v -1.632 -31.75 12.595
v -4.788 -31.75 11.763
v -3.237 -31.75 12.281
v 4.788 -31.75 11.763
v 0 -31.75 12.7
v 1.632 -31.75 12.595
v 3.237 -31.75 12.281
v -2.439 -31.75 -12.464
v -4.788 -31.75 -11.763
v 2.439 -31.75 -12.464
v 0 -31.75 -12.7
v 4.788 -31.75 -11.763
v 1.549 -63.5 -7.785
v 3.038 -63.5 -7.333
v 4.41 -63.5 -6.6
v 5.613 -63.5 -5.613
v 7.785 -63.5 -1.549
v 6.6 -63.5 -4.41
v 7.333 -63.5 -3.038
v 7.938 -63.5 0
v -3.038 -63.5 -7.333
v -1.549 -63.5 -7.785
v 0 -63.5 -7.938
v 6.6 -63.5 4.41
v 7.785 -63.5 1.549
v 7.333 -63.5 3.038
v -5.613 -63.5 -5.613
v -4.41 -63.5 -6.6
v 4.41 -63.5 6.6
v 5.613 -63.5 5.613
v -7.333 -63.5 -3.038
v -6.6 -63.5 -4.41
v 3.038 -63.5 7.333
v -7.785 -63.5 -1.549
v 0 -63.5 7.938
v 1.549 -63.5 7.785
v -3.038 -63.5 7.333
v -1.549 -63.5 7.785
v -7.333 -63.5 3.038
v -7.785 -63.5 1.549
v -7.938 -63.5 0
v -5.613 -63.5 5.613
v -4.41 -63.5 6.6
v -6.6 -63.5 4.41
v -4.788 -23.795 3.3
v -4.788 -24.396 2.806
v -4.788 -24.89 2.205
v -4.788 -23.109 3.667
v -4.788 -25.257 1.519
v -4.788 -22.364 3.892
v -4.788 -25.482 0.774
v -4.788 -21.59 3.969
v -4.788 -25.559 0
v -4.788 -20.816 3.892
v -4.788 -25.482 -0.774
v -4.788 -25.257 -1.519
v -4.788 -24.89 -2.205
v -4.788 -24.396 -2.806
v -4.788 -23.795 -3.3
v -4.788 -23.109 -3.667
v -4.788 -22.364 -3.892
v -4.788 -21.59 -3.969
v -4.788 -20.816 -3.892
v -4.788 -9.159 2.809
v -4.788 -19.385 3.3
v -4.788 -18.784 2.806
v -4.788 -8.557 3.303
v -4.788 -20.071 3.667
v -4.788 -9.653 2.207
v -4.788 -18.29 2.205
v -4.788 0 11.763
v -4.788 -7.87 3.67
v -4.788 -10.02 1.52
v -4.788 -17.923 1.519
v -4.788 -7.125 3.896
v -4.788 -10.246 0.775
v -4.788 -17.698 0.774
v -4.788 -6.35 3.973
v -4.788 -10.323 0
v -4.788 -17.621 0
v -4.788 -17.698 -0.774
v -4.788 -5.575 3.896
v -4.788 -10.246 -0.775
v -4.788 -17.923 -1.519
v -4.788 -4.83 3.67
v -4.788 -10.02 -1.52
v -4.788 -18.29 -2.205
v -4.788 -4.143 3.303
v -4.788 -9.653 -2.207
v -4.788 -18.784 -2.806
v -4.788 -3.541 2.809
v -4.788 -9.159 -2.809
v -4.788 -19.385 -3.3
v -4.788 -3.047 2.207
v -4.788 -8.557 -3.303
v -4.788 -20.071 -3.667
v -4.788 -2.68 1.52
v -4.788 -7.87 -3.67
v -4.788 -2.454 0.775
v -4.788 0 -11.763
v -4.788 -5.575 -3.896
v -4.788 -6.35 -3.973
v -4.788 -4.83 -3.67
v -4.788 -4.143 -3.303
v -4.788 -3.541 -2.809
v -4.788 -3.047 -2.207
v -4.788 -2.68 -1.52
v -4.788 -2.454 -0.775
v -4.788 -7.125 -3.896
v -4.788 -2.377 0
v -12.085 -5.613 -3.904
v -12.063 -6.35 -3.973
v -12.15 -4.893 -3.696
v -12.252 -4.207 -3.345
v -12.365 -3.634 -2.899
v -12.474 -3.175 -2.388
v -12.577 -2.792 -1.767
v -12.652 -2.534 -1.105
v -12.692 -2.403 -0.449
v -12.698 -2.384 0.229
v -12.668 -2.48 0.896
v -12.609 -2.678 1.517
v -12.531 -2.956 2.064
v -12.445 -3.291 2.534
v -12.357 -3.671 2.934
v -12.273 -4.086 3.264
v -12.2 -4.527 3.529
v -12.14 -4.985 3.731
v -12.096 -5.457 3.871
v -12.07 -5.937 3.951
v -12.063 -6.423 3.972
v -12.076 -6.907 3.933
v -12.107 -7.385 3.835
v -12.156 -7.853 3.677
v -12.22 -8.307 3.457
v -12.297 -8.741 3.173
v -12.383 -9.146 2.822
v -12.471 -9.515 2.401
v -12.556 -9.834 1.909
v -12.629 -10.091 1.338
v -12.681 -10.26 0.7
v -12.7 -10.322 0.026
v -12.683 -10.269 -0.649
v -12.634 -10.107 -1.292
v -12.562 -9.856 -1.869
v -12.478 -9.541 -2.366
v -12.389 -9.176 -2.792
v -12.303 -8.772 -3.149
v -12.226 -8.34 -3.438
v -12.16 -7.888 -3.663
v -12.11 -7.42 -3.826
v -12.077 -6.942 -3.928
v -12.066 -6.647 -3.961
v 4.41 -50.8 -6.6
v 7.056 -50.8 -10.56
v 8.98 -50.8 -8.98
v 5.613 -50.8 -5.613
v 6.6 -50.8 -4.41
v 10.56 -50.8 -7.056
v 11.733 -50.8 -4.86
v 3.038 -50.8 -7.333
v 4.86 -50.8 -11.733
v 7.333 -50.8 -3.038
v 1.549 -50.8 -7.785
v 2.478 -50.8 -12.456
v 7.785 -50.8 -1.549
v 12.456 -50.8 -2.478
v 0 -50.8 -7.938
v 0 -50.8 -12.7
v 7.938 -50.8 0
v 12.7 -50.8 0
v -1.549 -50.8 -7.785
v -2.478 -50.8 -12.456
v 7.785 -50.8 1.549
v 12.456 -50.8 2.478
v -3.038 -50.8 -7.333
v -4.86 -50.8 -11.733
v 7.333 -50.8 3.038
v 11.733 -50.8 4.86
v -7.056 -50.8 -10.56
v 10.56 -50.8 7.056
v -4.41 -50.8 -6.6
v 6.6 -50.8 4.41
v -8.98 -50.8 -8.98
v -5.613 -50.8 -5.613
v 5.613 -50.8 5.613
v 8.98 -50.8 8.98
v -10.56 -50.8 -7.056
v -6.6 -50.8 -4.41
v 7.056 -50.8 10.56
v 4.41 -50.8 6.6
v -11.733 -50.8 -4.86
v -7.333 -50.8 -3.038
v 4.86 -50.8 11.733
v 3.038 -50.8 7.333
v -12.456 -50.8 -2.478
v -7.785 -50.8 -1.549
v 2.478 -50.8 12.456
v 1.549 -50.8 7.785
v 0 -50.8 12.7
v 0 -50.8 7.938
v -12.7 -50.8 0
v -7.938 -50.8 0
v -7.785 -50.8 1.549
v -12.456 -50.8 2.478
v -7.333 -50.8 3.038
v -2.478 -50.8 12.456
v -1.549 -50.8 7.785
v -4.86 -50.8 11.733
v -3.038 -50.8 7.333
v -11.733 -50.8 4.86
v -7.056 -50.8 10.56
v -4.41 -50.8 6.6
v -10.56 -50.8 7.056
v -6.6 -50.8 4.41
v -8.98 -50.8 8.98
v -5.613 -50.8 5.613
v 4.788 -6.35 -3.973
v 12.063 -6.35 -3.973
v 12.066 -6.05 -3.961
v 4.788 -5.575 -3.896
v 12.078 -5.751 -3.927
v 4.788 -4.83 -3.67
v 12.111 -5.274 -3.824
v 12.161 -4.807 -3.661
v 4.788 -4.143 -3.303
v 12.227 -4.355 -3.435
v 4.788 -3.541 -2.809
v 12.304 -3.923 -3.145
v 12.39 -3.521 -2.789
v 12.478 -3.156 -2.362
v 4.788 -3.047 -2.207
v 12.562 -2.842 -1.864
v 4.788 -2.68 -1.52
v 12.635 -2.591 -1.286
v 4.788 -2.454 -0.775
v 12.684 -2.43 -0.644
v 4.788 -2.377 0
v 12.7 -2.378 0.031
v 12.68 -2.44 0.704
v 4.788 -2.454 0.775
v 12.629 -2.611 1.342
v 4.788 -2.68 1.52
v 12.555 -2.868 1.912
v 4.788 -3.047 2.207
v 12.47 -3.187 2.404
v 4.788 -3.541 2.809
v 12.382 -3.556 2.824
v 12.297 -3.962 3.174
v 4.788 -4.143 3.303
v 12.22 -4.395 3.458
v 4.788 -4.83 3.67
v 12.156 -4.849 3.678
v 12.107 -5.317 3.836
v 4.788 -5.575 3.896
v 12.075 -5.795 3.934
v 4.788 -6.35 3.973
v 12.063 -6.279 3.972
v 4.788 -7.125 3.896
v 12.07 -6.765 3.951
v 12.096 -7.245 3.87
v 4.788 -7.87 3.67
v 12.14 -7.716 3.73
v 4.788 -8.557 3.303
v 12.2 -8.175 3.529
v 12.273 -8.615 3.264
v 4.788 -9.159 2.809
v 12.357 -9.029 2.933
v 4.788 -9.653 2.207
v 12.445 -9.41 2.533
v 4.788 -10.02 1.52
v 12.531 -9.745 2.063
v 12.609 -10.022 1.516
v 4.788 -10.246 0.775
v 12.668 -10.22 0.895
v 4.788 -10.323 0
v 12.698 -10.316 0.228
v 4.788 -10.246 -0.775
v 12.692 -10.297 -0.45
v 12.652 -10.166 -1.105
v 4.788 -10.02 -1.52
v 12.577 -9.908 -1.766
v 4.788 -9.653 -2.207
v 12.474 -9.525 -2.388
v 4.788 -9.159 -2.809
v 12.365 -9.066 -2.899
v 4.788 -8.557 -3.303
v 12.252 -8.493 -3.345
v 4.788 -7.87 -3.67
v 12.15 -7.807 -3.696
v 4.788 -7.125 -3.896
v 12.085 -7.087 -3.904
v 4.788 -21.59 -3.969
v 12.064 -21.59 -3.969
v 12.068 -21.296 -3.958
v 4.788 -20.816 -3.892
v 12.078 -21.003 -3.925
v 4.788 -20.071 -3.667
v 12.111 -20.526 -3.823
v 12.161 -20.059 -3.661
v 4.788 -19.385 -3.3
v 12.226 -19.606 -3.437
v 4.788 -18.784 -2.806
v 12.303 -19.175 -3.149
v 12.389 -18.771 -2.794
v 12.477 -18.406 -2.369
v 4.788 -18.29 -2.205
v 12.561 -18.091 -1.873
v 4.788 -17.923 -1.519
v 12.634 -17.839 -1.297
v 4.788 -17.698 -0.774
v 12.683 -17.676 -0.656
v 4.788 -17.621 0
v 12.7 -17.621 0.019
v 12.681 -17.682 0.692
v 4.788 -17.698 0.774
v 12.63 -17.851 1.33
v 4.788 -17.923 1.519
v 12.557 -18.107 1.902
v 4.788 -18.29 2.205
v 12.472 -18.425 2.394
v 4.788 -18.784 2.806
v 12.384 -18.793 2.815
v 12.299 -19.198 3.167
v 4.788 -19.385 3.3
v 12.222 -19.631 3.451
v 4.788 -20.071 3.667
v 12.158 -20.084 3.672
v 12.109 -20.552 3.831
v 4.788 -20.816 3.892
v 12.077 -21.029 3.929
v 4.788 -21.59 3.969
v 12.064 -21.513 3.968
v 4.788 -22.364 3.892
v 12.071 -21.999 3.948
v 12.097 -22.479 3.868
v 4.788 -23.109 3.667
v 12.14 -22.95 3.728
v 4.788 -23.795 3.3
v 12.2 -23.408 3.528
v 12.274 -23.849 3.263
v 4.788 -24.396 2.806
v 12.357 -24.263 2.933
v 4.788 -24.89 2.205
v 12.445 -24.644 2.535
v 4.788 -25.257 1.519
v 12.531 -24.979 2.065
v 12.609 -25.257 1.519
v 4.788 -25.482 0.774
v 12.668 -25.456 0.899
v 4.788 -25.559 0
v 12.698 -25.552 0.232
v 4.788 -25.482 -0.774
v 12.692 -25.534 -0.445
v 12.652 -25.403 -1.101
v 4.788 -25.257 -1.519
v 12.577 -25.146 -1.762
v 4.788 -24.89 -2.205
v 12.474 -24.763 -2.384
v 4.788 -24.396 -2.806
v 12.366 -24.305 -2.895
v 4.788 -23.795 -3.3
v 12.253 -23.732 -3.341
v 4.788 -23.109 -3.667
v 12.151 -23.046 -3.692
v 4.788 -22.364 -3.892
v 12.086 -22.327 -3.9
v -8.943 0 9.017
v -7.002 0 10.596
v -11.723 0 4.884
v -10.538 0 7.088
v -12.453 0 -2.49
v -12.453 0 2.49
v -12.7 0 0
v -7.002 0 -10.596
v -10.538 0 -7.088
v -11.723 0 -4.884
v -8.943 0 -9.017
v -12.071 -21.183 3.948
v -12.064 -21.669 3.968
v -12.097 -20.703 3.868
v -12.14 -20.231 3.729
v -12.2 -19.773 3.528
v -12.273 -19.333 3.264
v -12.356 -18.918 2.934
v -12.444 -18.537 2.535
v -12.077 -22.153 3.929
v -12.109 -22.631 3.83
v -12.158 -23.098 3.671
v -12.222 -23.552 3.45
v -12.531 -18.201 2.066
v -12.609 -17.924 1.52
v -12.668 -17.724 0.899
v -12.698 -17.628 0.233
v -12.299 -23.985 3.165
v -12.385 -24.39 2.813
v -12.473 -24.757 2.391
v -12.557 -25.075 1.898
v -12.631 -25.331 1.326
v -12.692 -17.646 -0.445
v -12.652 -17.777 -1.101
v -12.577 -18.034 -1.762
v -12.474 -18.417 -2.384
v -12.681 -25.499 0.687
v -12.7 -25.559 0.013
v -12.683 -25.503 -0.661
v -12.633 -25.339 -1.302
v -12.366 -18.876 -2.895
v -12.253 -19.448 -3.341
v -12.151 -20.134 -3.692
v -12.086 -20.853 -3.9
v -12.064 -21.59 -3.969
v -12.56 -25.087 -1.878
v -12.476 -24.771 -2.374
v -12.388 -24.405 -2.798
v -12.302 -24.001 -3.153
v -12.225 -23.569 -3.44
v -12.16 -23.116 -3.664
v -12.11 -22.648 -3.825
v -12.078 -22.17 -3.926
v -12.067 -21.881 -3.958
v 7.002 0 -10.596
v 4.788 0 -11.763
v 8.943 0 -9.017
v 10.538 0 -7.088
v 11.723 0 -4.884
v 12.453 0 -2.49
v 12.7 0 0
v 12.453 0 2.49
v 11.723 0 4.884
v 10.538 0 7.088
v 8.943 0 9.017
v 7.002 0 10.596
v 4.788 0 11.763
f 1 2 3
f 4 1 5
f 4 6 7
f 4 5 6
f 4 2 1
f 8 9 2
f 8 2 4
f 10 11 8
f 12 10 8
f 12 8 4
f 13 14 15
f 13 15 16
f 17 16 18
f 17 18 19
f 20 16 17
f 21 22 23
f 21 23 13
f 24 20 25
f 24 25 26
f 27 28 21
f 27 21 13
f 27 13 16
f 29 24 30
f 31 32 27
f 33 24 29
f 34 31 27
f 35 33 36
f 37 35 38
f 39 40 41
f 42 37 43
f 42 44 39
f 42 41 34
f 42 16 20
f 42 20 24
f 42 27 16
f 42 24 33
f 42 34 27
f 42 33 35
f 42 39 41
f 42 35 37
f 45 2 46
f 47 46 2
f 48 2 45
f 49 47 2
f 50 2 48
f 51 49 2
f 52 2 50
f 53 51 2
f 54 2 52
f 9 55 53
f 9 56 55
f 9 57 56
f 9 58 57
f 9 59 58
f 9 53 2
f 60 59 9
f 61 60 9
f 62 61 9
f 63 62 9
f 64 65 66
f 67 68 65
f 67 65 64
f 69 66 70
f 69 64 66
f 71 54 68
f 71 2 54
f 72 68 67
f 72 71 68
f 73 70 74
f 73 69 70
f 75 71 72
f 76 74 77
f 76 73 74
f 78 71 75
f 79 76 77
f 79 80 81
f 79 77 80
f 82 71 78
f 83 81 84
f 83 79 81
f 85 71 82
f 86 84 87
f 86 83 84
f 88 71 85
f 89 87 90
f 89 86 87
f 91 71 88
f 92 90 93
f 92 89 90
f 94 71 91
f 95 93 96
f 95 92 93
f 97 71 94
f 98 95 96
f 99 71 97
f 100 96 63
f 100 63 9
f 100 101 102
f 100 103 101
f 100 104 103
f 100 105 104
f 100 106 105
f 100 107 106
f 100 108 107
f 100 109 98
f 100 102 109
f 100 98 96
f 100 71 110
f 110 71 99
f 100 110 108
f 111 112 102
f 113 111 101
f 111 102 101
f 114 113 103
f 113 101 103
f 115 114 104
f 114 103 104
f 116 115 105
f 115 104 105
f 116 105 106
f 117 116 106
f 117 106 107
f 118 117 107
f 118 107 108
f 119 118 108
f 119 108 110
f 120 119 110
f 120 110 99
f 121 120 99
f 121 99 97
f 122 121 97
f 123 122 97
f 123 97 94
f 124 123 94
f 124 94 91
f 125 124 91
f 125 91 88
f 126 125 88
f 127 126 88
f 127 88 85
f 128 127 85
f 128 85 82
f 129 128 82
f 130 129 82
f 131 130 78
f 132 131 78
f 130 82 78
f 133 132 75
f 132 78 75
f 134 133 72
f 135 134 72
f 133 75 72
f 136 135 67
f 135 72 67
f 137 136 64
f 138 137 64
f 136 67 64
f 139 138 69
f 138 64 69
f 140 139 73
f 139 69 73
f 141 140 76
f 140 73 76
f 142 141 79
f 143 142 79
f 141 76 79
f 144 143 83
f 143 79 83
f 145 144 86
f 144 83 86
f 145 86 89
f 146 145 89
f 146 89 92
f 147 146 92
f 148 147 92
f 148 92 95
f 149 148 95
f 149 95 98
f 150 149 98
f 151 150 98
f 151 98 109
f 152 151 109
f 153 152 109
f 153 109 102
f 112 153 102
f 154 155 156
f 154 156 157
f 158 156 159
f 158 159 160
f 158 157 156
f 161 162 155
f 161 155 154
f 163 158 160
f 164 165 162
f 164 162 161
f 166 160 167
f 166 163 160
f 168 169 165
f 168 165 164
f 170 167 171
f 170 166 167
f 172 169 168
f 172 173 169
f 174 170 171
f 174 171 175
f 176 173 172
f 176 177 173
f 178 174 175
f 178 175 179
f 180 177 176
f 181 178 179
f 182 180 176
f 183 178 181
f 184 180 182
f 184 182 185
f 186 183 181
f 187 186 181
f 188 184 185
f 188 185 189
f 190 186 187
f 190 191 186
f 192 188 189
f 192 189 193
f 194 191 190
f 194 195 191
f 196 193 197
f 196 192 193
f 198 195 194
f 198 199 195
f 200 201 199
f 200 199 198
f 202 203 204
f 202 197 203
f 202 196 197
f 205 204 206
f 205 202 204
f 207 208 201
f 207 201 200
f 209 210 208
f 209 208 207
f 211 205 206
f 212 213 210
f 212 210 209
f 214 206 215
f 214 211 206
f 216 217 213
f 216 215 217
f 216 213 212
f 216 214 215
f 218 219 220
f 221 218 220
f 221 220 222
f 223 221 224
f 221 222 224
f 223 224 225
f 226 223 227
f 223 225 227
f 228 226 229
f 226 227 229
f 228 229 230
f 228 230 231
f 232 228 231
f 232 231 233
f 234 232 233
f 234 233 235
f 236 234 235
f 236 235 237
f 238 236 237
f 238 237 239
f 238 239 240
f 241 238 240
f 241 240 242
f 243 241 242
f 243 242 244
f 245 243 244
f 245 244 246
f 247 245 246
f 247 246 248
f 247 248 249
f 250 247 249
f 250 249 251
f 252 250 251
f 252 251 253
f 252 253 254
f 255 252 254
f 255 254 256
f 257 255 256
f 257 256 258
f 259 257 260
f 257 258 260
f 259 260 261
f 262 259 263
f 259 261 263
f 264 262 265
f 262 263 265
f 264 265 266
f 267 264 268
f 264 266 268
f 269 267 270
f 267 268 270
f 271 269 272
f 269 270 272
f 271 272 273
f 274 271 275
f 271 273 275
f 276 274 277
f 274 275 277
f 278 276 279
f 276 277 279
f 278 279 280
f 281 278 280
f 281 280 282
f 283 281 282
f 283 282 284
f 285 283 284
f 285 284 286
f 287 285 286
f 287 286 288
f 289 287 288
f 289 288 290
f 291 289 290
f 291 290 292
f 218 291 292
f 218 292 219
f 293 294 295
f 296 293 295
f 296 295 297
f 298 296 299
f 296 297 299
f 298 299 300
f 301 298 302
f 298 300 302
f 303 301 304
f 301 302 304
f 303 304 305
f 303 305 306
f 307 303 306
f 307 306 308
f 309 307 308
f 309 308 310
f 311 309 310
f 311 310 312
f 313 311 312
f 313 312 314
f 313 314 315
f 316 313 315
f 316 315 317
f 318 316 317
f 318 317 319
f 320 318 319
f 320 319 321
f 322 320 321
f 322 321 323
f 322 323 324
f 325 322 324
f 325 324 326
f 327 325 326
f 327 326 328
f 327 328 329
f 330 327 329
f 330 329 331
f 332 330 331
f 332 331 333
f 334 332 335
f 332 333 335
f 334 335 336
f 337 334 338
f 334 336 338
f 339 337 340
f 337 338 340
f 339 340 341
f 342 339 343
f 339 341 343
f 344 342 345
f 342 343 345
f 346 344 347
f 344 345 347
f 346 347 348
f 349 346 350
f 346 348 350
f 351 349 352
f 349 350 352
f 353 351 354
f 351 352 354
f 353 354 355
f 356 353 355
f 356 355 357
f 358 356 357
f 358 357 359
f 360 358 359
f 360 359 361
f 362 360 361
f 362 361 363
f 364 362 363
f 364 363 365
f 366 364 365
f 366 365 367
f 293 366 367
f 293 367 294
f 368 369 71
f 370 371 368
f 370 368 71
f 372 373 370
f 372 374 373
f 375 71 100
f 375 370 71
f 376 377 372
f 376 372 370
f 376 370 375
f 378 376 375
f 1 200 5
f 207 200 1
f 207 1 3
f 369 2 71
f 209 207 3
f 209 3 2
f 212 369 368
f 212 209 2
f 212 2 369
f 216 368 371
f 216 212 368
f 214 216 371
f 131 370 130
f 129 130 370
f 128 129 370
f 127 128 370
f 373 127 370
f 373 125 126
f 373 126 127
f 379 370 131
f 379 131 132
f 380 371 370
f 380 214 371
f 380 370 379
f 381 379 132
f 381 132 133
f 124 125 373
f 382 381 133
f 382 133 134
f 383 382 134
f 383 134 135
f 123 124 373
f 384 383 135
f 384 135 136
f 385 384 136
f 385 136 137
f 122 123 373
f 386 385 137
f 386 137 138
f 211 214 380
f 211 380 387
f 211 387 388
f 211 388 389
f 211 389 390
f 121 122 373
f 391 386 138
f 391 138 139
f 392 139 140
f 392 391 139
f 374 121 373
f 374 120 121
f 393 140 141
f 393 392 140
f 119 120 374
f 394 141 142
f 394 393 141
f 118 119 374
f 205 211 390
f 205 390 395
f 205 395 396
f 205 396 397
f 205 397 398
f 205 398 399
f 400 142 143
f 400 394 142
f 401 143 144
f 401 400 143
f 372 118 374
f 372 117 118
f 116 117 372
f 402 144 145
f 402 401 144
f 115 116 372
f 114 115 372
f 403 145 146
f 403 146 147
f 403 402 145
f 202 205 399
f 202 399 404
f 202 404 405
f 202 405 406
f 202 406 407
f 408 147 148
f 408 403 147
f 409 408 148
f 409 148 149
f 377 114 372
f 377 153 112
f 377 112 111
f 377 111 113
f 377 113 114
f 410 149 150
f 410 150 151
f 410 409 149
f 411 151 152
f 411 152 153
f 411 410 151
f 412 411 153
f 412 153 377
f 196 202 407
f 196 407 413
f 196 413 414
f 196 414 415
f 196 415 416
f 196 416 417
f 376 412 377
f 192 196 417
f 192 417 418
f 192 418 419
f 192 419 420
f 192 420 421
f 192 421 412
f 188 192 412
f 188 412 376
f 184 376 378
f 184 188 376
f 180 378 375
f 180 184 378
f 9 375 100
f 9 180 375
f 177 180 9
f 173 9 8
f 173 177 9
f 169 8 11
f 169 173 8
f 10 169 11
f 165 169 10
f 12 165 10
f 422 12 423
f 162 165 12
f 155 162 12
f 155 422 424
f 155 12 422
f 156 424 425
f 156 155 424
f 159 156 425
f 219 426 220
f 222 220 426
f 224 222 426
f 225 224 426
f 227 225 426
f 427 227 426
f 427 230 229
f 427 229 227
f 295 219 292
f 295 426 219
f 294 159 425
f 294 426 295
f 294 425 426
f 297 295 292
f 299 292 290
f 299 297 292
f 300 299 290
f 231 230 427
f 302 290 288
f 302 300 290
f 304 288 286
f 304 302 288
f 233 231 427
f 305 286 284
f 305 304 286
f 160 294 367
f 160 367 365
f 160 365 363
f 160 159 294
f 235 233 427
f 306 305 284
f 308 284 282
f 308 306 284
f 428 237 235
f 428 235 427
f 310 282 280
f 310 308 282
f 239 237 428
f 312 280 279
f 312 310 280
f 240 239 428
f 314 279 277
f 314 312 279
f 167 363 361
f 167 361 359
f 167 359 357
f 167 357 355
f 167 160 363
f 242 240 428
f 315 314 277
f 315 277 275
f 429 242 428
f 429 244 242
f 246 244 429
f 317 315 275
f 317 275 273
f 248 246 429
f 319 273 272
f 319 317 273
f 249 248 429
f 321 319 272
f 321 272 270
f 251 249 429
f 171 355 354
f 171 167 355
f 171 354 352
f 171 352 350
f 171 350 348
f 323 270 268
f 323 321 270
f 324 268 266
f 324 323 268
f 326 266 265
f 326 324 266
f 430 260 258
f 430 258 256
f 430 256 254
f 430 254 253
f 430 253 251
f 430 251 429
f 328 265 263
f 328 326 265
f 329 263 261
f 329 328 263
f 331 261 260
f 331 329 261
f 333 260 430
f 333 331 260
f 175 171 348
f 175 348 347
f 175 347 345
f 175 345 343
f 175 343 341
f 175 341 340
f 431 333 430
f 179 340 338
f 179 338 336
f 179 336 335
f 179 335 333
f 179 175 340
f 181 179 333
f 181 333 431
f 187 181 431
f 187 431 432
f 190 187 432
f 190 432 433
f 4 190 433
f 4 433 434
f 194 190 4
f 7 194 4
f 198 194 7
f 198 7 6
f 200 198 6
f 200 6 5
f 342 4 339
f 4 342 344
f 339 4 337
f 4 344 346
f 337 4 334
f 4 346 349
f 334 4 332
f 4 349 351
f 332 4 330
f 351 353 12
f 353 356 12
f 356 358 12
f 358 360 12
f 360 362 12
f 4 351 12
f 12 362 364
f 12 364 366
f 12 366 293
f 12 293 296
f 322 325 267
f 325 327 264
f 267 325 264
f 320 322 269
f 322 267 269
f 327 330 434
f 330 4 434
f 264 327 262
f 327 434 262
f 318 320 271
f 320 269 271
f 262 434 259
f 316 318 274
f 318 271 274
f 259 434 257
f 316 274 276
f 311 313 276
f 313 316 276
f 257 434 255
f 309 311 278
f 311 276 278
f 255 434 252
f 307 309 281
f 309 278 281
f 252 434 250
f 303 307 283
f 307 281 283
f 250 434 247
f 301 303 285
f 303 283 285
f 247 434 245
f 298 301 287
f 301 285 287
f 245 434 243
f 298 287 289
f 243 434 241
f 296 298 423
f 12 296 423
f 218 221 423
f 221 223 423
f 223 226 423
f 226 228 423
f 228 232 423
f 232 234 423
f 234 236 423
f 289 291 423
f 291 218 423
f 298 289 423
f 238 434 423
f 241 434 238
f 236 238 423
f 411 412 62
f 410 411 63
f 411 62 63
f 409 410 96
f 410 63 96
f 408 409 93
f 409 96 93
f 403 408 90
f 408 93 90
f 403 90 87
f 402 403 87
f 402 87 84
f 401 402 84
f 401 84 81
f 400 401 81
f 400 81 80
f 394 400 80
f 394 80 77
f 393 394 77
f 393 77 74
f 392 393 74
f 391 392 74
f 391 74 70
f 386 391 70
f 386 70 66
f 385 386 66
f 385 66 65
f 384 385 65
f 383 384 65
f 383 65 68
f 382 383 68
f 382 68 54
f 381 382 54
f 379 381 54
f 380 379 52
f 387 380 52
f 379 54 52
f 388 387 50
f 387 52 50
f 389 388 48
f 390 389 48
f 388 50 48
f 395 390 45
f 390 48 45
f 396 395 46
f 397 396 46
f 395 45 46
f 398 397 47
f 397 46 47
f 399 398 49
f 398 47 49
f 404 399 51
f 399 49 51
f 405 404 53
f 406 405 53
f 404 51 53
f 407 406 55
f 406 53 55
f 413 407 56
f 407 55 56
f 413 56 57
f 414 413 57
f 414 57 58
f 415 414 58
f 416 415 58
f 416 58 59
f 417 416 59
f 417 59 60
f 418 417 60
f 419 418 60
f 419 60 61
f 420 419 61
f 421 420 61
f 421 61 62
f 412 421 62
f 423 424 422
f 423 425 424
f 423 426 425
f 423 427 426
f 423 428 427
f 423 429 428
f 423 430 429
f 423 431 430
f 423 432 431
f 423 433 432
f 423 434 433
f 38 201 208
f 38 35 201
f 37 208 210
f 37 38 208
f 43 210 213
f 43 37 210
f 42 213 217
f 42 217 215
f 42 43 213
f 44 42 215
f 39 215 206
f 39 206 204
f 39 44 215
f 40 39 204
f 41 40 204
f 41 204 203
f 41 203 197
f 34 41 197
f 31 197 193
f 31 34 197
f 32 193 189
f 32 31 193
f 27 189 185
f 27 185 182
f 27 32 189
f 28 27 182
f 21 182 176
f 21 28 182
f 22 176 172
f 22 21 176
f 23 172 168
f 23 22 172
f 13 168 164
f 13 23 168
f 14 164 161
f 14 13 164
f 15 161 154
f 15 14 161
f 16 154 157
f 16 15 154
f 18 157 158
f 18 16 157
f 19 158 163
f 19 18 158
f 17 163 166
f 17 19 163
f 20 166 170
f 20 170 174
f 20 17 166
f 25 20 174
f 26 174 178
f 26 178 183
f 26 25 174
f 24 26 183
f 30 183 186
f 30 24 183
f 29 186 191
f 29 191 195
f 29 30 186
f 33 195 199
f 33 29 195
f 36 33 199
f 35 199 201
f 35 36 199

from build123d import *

# Parameters (mm, degrees)
SKETCH3_W          = 9.5758
SKETCH3_H          = 52.44541986
CUT_EXTRUDE2_DEPTH = 31.75
SKETCH4_R          = 3.97256
SKETCH4_R_2        = 3.96875
CUT_EXTRUDE3_DEPTH = 26.4


with BuildPart() as part:
    # Sketch1 → Revolve1 (revolve)
    with BuildSketch(Plane(origin=(0, 0, 0), x_dir=(0, 0, -1), z_dir=(1, 0, 0))):
        Polygon((0, 0), (-12.7, 0), (-12.7, -50.8), (-7.9375, -50.8), (-7.9375, -63.5), (0, -63.5), (0, -50.8), align=None)
    revolve(axis=Axis((0, 54.105122951, 0), (0, -1, 0)))

    # Sketch3 → Cut-Extrude2 (cut)
    with BuildSketch(Plane(origin=(0, 0, 0), x_dir=(1, 0, 0), z_dir=(0, 1, 0))):
        Rectangle(SKETCH3_W, SKETCH3_H)
    extrude(amount=-CUT_EXTRUDE2_DEPTH, mode=Mode.SUBTRACT)

    # Sketch4 → Cut-Extrude3 (cut, through all)
    with BuildSketch(Plane(origin=(12.7, 0, 0), x_dir=(0, 0, -1), z_dir=(1, 0, 0))):
        with Locations((0, -6.35)):
            Circle(SKETCH4_R)
        with Locations((0, -21.59)):
            Circle(SKETCH4_R_2)
    extrude(amount=-CUT_EXTRUDE3_DEPTH, mode=Mode.SUBTRACT)


solid = part.part
